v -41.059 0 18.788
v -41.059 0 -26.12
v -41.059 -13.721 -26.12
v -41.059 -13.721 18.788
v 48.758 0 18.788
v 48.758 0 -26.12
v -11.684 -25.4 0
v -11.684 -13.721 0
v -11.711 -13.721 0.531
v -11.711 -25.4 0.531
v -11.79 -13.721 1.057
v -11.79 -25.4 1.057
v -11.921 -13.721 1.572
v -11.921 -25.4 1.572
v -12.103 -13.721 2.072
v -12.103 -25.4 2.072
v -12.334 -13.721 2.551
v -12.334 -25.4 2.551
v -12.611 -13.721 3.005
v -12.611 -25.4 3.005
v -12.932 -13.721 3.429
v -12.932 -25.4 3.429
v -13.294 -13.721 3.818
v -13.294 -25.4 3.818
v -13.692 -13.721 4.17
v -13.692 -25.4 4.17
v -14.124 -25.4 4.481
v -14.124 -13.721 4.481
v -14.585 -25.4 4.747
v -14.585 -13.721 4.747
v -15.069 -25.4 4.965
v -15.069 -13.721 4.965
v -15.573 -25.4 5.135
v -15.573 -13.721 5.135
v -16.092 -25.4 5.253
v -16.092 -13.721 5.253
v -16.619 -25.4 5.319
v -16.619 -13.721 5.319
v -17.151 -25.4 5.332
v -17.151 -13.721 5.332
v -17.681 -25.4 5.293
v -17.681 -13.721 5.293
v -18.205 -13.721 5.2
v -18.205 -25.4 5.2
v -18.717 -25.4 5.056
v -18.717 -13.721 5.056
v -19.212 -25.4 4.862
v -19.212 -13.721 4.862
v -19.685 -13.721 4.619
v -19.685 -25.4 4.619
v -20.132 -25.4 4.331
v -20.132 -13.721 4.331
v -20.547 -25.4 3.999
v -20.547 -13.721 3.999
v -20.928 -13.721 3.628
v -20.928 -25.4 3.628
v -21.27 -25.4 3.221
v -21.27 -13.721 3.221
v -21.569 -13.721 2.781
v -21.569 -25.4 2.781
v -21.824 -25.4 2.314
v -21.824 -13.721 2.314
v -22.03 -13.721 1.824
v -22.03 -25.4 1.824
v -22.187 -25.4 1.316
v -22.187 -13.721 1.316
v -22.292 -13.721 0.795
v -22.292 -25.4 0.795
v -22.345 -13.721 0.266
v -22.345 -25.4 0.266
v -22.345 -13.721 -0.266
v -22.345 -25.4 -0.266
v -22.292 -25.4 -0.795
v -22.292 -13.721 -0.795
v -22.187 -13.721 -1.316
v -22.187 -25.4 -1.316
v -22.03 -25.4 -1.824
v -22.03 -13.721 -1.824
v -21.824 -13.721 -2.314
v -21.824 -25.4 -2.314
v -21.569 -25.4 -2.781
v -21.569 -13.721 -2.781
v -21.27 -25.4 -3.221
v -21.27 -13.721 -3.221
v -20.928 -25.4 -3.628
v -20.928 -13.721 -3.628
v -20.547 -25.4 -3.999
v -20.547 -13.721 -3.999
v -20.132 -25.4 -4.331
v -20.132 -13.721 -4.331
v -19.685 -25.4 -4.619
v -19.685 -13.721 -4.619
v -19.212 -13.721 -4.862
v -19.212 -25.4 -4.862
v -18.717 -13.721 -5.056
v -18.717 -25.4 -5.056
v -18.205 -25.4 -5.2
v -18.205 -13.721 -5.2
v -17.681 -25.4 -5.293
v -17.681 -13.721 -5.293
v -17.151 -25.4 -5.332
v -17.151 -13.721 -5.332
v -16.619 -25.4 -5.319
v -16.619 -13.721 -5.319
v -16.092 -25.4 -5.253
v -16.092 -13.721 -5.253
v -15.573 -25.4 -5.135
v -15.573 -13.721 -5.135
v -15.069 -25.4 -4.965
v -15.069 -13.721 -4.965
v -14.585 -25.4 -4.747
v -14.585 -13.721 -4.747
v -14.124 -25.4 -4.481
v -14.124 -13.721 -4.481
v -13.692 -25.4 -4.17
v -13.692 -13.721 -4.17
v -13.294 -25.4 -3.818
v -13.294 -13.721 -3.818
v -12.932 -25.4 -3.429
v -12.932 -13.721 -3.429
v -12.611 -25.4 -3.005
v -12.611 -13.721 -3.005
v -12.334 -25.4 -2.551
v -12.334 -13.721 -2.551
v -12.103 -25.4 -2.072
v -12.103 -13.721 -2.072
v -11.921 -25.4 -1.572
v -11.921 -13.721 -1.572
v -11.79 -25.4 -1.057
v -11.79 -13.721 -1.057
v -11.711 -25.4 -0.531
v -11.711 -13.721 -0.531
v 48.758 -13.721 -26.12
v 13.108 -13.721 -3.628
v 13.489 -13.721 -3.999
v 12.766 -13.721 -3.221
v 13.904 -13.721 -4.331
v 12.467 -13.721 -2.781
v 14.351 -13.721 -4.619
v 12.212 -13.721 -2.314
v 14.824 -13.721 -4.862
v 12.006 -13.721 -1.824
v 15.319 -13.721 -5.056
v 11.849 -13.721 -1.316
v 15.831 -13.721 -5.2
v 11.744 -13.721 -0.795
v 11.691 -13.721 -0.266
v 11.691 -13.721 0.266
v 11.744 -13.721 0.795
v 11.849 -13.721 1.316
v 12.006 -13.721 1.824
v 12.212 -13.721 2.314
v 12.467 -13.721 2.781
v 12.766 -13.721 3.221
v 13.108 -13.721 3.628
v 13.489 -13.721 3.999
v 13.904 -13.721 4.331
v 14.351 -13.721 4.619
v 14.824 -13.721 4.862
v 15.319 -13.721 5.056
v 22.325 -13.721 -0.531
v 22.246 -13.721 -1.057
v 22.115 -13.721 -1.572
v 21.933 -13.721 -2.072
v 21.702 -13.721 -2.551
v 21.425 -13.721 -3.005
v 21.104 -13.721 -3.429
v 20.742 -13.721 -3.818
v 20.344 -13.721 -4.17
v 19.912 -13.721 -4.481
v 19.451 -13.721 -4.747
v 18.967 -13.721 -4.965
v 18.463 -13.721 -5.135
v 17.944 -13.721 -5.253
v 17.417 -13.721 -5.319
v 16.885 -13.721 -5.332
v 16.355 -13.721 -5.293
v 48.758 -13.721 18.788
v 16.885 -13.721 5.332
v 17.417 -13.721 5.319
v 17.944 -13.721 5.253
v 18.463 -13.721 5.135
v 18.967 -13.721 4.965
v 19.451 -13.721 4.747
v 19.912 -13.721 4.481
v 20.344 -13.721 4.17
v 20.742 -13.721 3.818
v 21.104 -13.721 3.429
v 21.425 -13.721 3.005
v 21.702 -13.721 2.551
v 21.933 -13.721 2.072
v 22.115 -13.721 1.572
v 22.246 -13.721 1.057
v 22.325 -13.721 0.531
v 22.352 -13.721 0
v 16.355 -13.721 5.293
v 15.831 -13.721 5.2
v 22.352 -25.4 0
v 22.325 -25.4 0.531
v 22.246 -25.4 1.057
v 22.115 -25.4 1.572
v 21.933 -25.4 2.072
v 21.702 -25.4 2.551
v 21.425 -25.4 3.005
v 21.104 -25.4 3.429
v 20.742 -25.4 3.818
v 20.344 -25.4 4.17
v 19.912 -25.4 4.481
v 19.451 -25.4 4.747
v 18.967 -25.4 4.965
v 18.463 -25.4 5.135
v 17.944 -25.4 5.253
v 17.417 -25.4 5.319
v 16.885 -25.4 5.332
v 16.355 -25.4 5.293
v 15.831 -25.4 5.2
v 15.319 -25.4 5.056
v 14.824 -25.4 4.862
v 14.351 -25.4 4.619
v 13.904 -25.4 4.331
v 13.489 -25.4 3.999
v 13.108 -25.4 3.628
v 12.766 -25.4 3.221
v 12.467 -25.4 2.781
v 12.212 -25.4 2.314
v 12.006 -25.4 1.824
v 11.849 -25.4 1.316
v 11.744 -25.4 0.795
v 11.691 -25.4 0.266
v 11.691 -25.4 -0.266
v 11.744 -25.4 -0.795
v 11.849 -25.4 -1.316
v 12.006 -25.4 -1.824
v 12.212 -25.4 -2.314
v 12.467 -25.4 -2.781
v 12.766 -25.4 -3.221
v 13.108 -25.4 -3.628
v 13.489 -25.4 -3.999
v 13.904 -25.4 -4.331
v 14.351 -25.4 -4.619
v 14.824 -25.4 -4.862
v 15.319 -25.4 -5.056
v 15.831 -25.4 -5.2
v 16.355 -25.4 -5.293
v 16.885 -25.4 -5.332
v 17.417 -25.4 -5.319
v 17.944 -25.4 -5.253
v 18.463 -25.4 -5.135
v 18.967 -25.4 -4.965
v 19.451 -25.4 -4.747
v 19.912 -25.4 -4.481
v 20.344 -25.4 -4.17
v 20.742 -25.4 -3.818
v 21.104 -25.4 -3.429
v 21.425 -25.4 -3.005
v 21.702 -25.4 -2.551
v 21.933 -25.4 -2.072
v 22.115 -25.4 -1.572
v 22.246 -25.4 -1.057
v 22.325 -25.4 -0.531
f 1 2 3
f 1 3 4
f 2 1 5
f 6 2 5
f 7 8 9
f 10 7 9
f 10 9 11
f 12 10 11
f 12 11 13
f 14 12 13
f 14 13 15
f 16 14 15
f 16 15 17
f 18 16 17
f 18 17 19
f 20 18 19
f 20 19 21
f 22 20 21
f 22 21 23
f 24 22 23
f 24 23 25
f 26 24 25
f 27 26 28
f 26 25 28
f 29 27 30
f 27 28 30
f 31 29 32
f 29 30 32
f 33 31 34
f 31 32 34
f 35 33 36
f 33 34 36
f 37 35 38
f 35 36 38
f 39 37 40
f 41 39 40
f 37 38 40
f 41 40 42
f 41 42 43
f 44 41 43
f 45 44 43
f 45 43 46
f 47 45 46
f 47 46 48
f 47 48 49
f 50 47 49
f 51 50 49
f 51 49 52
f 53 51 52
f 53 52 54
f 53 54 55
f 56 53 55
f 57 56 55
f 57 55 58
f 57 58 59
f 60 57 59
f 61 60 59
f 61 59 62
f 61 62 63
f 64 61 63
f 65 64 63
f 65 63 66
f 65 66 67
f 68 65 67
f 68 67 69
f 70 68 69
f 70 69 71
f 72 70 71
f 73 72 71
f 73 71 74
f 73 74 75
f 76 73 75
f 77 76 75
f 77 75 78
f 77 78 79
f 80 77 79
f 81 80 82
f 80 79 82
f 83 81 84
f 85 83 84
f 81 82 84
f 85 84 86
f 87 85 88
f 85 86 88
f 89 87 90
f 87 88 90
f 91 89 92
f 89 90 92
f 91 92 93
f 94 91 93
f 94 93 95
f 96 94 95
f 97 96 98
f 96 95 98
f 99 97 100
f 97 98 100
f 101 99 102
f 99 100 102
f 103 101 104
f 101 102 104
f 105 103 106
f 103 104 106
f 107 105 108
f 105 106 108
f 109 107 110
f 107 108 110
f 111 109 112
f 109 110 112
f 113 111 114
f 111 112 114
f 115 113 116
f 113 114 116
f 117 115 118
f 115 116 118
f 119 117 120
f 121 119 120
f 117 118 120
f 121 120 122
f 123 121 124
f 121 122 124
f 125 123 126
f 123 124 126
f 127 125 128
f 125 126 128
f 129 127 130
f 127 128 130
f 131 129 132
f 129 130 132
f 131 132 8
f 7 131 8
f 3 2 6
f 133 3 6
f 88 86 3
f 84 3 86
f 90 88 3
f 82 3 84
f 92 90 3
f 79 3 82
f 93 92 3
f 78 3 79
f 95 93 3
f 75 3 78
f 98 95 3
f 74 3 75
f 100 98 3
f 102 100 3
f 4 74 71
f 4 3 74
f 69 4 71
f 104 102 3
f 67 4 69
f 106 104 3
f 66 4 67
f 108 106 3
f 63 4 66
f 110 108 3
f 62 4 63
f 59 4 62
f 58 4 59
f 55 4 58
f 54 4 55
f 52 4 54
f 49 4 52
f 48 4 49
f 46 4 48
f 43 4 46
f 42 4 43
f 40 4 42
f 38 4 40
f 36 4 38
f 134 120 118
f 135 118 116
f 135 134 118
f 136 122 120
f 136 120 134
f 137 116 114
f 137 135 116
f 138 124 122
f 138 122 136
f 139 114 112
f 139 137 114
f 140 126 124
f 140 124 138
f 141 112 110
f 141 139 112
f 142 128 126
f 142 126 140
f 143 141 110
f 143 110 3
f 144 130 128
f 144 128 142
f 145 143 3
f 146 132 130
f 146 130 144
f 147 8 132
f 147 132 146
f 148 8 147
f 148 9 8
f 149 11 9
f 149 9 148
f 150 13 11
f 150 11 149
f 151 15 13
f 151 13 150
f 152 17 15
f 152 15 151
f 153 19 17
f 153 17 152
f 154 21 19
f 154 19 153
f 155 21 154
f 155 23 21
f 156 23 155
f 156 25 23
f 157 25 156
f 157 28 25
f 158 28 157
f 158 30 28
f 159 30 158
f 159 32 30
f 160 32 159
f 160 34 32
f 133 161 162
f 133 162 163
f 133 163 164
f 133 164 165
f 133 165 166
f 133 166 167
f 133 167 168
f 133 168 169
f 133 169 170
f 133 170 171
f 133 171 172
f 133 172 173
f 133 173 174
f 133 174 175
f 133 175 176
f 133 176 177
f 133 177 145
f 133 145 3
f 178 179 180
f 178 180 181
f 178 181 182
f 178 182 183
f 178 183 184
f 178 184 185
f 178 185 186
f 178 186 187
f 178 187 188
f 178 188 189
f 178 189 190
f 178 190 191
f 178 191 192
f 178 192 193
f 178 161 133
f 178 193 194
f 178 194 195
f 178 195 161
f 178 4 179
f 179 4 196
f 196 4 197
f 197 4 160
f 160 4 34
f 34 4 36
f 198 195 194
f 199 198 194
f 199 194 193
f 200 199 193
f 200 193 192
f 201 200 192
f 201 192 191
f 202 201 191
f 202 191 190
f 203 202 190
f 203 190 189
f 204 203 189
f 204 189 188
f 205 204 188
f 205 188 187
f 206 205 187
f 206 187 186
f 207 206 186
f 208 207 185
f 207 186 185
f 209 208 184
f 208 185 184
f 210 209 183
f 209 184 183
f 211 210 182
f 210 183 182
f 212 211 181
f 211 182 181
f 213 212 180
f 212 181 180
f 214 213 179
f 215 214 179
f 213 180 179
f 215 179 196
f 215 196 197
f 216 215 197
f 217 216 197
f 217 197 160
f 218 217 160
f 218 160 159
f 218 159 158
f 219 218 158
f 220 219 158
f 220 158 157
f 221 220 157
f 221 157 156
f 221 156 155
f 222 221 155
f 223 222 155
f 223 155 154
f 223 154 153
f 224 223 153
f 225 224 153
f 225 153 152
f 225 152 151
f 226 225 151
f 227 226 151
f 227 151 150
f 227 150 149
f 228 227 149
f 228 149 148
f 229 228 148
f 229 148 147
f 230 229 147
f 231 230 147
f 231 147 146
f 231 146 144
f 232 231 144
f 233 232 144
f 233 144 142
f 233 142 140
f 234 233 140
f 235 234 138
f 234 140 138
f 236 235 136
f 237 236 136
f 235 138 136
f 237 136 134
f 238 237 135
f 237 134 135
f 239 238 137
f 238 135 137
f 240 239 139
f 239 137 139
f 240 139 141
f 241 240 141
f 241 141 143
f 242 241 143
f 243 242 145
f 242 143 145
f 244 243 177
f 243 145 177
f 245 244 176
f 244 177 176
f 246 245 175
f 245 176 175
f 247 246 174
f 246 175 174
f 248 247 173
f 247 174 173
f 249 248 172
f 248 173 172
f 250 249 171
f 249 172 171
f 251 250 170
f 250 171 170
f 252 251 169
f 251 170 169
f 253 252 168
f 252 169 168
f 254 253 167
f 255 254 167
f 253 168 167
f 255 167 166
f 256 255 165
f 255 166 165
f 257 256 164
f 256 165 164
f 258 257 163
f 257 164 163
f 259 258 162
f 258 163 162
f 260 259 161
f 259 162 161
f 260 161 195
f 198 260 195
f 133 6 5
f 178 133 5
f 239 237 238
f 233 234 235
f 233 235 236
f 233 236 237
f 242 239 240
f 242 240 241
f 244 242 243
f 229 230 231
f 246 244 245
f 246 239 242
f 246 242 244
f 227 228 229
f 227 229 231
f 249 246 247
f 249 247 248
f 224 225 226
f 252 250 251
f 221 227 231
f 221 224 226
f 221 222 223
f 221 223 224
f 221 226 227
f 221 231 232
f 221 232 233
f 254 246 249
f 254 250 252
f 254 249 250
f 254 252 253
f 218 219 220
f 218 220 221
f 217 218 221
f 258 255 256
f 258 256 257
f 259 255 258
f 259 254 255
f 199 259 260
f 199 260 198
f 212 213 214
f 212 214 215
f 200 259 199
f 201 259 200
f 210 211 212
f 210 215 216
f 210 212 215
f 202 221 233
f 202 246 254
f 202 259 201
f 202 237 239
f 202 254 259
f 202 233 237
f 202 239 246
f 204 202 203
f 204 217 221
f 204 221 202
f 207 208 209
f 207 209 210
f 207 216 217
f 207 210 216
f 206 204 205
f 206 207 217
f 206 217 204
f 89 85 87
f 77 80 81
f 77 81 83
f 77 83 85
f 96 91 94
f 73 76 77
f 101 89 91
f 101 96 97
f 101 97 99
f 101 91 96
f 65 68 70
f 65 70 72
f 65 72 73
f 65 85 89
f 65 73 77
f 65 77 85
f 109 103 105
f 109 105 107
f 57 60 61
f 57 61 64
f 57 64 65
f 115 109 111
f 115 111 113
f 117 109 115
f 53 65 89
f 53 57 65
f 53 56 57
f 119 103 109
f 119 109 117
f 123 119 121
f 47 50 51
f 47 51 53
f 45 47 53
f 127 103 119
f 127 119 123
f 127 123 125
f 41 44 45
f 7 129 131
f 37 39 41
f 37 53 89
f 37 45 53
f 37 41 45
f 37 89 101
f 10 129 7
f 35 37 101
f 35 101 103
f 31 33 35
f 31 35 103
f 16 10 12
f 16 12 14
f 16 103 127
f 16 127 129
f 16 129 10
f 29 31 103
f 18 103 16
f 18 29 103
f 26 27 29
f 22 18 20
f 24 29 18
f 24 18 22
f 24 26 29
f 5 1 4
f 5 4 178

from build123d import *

# Parameters (mm, degrees)
F0_W     = 89.816496
F0_H     = 44.908248
F0_R     = 5.334
F1_DEPTH = 13.72113
F2_DEPTH = 25.4


with BuildPart() as f1:
    # F0 (on Front) → F1 (new body)
    with BuildSketch(Plane.XZ):
        with Locations((3.849279, -3.66598)):
            Rectangle(F0_W, F0_H)
        with Locations((-17.018, 0)):
            Circle(F0_R, mode=Mode.SUBTRACT)
        with Locations((17.018, 0)):
            Circle(F0_R, mode=Mode.SUBTRACT)
        with Locations((-17.018, 0)):
            Circle(F0_R)
        with Locations((17.018, 0)):
            Circle(F0_R)
    extrude(amount=F1_DEPTH)

    # F0 (on Front) → F2 (join)
    with BuildSketch(Plane.XZ):
        with Locations((17.018, 0)):
            Circle(F0_R)
        with Locations((-17.018, 0)):
            Circle(F0_R)
    extrude(amount=F2_DEPTH)


solid = f1.part
